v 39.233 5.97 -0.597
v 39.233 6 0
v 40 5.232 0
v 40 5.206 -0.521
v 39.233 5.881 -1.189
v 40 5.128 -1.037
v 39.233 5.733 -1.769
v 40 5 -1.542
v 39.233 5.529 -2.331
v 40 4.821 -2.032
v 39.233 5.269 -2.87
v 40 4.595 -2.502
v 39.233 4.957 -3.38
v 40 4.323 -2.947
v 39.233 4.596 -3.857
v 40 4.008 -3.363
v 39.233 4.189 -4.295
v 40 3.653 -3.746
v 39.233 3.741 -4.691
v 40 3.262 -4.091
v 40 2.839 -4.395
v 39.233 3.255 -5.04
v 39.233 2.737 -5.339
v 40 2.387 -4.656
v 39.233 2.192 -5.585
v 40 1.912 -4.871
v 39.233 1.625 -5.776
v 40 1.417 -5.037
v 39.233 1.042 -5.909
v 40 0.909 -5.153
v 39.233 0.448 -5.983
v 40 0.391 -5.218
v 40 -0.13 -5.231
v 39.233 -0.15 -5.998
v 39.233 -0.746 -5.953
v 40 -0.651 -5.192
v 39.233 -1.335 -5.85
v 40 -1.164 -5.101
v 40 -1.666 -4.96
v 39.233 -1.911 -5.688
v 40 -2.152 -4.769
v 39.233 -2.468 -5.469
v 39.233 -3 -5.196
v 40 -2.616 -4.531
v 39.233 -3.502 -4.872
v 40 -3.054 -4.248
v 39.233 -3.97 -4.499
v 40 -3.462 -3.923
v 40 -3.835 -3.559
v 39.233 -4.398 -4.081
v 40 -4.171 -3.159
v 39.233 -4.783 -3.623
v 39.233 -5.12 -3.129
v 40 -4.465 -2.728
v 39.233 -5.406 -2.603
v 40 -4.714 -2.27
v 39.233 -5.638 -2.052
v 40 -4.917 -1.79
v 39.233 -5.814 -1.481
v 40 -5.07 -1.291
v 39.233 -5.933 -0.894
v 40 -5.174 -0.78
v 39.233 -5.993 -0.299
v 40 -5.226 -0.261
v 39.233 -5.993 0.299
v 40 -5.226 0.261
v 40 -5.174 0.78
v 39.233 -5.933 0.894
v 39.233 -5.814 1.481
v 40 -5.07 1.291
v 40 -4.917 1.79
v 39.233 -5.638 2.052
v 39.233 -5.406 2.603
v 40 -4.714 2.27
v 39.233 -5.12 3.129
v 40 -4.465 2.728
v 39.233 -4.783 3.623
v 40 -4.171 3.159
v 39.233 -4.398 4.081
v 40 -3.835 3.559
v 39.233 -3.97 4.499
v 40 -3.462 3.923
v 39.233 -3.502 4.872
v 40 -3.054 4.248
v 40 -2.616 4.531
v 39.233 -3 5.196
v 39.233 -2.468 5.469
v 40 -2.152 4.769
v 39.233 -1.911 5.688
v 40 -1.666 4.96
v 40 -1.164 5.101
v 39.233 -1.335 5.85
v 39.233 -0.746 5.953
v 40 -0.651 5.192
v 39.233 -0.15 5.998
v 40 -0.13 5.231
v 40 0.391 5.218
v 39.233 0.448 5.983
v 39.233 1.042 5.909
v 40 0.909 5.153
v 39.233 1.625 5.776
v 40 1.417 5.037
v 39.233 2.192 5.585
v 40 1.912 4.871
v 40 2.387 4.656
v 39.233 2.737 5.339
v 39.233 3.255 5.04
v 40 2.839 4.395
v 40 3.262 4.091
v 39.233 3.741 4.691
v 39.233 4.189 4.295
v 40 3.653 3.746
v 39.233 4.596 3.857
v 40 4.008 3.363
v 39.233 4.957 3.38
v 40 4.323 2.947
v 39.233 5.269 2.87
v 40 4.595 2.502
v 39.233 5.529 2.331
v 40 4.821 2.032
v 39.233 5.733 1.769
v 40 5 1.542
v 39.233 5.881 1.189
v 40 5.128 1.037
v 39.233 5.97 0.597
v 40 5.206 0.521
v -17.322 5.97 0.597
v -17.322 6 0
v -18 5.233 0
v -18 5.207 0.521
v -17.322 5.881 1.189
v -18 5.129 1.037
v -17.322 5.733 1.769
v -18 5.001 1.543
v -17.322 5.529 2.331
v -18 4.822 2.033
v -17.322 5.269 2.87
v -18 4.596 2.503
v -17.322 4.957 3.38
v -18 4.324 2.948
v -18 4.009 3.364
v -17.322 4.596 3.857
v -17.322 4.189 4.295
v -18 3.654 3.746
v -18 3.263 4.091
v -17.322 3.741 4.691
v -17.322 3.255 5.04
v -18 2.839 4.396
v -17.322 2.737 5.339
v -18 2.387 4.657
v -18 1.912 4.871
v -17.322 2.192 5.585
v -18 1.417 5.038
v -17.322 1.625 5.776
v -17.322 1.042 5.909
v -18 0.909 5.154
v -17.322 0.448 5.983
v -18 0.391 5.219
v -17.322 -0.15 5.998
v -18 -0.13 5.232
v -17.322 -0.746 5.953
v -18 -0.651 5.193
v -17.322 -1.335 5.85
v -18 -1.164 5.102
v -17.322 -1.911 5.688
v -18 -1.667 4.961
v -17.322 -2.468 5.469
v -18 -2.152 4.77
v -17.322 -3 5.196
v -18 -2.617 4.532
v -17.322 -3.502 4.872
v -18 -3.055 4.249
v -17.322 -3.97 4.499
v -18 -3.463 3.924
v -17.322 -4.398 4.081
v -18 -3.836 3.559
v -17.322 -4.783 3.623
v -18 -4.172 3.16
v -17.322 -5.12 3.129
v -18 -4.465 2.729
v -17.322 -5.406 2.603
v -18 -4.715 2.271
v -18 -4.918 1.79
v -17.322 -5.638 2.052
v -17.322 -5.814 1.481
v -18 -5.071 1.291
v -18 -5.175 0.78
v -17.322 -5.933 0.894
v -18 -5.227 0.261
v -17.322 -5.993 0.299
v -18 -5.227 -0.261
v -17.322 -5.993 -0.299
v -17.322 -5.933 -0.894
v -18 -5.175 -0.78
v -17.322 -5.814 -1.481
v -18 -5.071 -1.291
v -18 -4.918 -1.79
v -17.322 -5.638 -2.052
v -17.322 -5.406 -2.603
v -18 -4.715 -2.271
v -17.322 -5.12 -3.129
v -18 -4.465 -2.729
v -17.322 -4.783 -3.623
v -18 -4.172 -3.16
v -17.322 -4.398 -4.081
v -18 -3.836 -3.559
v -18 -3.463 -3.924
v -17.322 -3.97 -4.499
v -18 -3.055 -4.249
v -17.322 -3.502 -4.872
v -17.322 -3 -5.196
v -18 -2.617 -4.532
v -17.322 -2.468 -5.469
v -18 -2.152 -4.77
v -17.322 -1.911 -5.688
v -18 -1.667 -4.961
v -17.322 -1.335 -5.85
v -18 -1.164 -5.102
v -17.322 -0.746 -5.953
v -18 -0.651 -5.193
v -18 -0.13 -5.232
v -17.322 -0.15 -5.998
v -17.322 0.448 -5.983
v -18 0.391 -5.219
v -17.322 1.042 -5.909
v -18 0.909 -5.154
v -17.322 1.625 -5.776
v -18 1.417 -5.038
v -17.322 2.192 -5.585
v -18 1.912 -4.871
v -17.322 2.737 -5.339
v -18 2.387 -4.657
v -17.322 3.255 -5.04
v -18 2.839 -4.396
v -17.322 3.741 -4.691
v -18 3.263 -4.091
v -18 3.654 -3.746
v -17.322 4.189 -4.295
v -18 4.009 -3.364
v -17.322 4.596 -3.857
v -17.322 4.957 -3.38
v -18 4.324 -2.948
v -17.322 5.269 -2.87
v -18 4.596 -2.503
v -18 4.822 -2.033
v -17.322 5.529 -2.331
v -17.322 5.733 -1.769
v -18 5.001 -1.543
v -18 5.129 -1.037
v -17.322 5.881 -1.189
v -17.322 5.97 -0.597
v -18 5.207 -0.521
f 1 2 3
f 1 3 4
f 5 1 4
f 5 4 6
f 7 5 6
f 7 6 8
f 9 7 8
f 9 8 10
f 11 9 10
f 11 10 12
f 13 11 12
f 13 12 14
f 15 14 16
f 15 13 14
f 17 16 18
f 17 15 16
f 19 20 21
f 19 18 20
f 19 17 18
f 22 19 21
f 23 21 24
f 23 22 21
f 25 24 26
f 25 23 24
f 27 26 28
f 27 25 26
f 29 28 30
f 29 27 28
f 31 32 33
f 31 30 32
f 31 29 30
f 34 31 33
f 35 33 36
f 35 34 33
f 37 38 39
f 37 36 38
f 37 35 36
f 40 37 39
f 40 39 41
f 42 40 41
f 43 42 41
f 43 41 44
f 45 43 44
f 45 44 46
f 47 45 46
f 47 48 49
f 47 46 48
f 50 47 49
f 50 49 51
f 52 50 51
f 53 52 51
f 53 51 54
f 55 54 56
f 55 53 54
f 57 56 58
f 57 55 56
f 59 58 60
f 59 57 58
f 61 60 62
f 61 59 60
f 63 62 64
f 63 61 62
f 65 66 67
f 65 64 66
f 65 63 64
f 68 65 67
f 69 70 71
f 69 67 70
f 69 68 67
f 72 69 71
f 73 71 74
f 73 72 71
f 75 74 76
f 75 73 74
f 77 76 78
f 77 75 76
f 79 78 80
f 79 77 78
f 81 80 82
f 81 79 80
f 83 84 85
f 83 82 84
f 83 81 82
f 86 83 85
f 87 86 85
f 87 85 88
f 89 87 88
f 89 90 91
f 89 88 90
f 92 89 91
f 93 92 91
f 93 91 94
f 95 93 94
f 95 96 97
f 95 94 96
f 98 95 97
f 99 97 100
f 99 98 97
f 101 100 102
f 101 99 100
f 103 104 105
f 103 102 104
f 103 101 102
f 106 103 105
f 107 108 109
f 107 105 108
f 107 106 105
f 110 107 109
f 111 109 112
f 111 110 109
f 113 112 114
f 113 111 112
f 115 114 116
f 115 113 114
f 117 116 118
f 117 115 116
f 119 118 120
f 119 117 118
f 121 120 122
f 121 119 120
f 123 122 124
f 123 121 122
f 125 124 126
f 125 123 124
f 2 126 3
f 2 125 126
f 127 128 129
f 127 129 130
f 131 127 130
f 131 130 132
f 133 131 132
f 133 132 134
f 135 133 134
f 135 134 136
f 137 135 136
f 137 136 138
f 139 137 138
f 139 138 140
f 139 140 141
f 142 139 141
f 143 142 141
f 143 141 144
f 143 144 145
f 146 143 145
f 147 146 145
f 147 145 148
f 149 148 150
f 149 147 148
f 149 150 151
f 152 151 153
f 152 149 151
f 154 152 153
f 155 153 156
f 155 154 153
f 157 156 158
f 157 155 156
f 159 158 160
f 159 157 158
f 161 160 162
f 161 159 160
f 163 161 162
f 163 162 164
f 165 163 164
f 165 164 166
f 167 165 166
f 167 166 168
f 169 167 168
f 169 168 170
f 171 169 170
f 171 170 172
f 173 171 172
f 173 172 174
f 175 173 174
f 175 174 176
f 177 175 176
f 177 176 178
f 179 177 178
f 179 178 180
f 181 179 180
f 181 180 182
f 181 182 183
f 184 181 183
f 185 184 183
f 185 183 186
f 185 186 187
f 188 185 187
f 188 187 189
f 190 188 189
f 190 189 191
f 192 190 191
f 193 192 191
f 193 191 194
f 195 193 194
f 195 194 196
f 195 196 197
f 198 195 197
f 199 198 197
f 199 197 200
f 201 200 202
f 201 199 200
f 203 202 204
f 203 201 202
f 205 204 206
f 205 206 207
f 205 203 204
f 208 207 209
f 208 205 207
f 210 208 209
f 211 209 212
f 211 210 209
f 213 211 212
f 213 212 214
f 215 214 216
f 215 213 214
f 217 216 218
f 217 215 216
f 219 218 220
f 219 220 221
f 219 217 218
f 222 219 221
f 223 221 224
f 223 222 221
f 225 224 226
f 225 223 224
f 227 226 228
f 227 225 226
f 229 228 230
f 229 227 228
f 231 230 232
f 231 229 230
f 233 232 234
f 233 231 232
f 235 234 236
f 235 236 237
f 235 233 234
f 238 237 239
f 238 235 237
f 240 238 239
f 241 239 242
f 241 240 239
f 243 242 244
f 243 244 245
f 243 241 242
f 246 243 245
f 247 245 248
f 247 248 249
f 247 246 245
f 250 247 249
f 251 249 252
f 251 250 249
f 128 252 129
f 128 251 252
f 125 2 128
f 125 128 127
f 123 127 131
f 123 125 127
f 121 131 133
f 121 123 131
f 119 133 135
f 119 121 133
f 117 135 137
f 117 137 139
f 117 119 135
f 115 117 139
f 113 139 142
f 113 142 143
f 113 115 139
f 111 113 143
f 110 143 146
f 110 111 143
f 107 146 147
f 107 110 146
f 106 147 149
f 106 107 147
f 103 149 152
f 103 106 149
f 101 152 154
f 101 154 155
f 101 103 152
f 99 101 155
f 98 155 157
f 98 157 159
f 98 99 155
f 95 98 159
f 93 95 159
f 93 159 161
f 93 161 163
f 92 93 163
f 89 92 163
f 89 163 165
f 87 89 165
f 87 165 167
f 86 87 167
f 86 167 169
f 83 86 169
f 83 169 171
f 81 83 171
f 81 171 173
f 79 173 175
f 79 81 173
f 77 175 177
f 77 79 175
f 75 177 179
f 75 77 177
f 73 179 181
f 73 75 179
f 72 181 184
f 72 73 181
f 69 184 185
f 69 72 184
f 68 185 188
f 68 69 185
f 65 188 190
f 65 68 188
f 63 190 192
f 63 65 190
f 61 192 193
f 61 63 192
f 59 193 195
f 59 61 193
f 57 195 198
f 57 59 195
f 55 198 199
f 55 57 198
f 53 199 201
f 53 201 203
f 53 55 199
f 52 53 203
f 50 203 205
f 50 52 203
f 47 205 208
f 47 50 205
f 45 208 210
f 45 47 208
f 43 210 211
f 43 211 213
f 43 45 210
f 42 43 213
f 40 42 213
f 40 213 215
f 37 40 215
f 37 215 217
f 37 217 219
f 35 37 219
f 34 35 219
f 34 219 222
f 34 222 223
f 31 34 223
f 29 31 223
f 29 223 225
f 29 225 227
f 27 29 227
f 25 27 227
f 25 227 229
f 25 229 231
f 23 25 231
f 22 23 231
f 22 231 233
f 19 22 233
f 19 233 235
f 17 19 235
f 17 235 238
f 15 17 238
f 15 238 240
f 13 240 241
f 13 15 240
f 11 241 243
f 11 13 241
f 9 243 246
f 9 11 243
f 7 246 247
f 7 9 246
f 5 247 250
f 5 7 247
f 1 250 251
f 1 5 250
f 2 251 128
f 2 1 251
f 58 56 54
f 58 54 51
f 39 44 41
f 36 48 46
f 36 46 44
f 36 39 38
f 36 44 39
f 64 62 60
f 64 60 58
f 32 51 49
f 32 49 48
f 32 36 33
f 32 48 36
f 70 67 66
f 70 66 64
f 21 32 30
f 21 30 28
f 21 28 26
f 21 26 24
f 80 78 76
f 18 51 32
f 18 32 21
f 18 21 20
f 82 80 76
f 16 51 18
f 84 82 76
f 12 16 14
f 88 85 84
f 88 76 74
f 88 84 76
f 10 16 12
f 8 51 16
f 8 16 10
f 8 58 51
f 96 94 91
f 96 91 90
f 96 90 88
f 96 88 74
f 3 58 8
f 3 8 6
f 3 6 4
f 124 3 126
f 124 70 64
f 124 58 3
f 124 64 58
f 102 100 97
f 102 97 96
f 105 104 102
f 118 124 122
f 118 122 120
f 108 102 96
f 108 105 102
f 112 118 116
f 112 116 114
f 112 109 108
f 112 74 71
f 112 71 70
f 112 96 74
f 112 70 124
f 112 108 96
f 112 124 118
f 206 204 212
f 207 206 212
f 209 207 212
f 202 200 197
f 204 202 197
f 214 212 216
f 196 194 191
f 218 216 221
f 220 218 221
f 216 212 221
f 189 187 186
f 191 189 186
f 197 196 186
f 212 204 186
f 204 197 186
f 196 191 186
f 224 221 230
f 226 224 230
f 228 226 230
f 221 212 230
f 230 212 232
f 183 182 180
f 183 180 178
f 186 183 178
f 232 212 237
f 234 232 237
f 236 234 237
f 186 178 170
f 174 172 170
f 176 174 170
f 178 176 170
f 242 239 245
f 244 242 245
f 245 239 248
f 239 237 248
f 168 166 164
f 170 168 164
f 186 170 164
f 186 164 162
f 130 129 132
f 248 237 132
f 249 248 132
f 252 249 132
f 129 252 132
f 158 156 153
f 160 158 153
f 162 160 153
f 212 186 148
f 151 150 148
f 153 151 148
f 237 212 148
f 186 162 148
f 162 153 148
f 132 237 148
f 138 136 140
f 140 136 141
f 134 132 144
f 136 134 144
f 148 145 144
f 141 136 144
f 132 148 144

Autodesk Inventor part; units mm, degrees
ref_plane "YZ Plane" through (0, 0, 0) normal (1, 0, 0) x (0, 1, 0)
ref_plane "XZ Plane" through (0, 0, 0) normal (0, 1, 0) x (-1, 0, 0)
sketch "Skizze1" plane through (0, 0, 0) normal (0, 0, 1) x (1, 0, 0)
  line L0 (40, 6) -> (40, 0)
  line L1 (-18, 0) -> (40, 0)
  line L2 (-29.6, 0) -> (51.6, 0) projected
  line L3 (0, 7.2) -> (0, -1.2) projected
  line L4 (-18, 6) -> (-18, 0)
  line L5 (10, 6) -> (10, 0) construction
  line L6 (-29.6, 0) -> (51.6, 0) projected
  line L7 (-18, 6) -> (40, 6)
  dimension "d4" = 18
  dimension "d5" = 40
  dimension "d6" = 30
  dimension "d13" = 12
revolve "Körper" add sketch "Skizze1" angle 360 about axis through (-18, 0, 0) along (1, 0, 0)
thread "Gewinde1" size "M12x1.25" class "6g" standard "ISO Metric profile" length 18
thread "Gewinde2" size "M12x1.25" class "6g" standard "ISO Metric profile" length 30.7668
chamfer "Fase1" distance 0.7678 distance2 0.7668 1 edges at (40, -6, 0) measured on face at (40, -3.0269, -1.5886)
chamfer "Fase2" distance 0.6776 distance2 0.7668 1 edges at (-18, -6, 0) measured on face at (20.1555, 5.9805, -0.4828)
ref_plane "Work Plane1" through (2.75, 0, 0) normal (0, -1, 0) x (1, 0, 0)
equation "\"d4\" = KOH"
equation "\"d5\" = NLG"
equation "\"d6\" = GEL"
equation "\"d13\" = GD"
equation "\"d1\" = KOH"
equation "\"d7\" = GEL + GAL"
equation "\"d10\" = -0.5 * SPD + 0.5 * GD"
equation "\"d12\" = -0.5 * SPD + 0.5 * GD"
equation "\"NLG\" = 40"
equation "\"GEL\" = 30"
equation "\"GAL\" = 0.61345 * PTC"
equation "\"SPD\" = NND - 1.2269 * PTC"
equation "\"d0\" = GD"
equation "\"GUL\" = 0.61345 * PTC"
equation "\"KOH\" = 18"
equation "\"GD\" = NND"
equation "\"BDM\" = NND"
equation "\"GUL1\" = 0.67658"
equation "\"GAL1\" = GAL"
equation "\"d80\" = -GUL - GEL"
equation "\"d86\" = -KOH + GUL1"
equation "\"PTC\" = 1.25"
equation "\"THREADDIA\" = 12"
equation "\"TOA\" = 30deg"
equation "\"NND\" = 12"
equation "\"GD1\" = THREADDIA - 1.2269 * PTC"
properties part number "UNI 5910 - M12 x 1,25 x 40" material "Steel, Mild"
